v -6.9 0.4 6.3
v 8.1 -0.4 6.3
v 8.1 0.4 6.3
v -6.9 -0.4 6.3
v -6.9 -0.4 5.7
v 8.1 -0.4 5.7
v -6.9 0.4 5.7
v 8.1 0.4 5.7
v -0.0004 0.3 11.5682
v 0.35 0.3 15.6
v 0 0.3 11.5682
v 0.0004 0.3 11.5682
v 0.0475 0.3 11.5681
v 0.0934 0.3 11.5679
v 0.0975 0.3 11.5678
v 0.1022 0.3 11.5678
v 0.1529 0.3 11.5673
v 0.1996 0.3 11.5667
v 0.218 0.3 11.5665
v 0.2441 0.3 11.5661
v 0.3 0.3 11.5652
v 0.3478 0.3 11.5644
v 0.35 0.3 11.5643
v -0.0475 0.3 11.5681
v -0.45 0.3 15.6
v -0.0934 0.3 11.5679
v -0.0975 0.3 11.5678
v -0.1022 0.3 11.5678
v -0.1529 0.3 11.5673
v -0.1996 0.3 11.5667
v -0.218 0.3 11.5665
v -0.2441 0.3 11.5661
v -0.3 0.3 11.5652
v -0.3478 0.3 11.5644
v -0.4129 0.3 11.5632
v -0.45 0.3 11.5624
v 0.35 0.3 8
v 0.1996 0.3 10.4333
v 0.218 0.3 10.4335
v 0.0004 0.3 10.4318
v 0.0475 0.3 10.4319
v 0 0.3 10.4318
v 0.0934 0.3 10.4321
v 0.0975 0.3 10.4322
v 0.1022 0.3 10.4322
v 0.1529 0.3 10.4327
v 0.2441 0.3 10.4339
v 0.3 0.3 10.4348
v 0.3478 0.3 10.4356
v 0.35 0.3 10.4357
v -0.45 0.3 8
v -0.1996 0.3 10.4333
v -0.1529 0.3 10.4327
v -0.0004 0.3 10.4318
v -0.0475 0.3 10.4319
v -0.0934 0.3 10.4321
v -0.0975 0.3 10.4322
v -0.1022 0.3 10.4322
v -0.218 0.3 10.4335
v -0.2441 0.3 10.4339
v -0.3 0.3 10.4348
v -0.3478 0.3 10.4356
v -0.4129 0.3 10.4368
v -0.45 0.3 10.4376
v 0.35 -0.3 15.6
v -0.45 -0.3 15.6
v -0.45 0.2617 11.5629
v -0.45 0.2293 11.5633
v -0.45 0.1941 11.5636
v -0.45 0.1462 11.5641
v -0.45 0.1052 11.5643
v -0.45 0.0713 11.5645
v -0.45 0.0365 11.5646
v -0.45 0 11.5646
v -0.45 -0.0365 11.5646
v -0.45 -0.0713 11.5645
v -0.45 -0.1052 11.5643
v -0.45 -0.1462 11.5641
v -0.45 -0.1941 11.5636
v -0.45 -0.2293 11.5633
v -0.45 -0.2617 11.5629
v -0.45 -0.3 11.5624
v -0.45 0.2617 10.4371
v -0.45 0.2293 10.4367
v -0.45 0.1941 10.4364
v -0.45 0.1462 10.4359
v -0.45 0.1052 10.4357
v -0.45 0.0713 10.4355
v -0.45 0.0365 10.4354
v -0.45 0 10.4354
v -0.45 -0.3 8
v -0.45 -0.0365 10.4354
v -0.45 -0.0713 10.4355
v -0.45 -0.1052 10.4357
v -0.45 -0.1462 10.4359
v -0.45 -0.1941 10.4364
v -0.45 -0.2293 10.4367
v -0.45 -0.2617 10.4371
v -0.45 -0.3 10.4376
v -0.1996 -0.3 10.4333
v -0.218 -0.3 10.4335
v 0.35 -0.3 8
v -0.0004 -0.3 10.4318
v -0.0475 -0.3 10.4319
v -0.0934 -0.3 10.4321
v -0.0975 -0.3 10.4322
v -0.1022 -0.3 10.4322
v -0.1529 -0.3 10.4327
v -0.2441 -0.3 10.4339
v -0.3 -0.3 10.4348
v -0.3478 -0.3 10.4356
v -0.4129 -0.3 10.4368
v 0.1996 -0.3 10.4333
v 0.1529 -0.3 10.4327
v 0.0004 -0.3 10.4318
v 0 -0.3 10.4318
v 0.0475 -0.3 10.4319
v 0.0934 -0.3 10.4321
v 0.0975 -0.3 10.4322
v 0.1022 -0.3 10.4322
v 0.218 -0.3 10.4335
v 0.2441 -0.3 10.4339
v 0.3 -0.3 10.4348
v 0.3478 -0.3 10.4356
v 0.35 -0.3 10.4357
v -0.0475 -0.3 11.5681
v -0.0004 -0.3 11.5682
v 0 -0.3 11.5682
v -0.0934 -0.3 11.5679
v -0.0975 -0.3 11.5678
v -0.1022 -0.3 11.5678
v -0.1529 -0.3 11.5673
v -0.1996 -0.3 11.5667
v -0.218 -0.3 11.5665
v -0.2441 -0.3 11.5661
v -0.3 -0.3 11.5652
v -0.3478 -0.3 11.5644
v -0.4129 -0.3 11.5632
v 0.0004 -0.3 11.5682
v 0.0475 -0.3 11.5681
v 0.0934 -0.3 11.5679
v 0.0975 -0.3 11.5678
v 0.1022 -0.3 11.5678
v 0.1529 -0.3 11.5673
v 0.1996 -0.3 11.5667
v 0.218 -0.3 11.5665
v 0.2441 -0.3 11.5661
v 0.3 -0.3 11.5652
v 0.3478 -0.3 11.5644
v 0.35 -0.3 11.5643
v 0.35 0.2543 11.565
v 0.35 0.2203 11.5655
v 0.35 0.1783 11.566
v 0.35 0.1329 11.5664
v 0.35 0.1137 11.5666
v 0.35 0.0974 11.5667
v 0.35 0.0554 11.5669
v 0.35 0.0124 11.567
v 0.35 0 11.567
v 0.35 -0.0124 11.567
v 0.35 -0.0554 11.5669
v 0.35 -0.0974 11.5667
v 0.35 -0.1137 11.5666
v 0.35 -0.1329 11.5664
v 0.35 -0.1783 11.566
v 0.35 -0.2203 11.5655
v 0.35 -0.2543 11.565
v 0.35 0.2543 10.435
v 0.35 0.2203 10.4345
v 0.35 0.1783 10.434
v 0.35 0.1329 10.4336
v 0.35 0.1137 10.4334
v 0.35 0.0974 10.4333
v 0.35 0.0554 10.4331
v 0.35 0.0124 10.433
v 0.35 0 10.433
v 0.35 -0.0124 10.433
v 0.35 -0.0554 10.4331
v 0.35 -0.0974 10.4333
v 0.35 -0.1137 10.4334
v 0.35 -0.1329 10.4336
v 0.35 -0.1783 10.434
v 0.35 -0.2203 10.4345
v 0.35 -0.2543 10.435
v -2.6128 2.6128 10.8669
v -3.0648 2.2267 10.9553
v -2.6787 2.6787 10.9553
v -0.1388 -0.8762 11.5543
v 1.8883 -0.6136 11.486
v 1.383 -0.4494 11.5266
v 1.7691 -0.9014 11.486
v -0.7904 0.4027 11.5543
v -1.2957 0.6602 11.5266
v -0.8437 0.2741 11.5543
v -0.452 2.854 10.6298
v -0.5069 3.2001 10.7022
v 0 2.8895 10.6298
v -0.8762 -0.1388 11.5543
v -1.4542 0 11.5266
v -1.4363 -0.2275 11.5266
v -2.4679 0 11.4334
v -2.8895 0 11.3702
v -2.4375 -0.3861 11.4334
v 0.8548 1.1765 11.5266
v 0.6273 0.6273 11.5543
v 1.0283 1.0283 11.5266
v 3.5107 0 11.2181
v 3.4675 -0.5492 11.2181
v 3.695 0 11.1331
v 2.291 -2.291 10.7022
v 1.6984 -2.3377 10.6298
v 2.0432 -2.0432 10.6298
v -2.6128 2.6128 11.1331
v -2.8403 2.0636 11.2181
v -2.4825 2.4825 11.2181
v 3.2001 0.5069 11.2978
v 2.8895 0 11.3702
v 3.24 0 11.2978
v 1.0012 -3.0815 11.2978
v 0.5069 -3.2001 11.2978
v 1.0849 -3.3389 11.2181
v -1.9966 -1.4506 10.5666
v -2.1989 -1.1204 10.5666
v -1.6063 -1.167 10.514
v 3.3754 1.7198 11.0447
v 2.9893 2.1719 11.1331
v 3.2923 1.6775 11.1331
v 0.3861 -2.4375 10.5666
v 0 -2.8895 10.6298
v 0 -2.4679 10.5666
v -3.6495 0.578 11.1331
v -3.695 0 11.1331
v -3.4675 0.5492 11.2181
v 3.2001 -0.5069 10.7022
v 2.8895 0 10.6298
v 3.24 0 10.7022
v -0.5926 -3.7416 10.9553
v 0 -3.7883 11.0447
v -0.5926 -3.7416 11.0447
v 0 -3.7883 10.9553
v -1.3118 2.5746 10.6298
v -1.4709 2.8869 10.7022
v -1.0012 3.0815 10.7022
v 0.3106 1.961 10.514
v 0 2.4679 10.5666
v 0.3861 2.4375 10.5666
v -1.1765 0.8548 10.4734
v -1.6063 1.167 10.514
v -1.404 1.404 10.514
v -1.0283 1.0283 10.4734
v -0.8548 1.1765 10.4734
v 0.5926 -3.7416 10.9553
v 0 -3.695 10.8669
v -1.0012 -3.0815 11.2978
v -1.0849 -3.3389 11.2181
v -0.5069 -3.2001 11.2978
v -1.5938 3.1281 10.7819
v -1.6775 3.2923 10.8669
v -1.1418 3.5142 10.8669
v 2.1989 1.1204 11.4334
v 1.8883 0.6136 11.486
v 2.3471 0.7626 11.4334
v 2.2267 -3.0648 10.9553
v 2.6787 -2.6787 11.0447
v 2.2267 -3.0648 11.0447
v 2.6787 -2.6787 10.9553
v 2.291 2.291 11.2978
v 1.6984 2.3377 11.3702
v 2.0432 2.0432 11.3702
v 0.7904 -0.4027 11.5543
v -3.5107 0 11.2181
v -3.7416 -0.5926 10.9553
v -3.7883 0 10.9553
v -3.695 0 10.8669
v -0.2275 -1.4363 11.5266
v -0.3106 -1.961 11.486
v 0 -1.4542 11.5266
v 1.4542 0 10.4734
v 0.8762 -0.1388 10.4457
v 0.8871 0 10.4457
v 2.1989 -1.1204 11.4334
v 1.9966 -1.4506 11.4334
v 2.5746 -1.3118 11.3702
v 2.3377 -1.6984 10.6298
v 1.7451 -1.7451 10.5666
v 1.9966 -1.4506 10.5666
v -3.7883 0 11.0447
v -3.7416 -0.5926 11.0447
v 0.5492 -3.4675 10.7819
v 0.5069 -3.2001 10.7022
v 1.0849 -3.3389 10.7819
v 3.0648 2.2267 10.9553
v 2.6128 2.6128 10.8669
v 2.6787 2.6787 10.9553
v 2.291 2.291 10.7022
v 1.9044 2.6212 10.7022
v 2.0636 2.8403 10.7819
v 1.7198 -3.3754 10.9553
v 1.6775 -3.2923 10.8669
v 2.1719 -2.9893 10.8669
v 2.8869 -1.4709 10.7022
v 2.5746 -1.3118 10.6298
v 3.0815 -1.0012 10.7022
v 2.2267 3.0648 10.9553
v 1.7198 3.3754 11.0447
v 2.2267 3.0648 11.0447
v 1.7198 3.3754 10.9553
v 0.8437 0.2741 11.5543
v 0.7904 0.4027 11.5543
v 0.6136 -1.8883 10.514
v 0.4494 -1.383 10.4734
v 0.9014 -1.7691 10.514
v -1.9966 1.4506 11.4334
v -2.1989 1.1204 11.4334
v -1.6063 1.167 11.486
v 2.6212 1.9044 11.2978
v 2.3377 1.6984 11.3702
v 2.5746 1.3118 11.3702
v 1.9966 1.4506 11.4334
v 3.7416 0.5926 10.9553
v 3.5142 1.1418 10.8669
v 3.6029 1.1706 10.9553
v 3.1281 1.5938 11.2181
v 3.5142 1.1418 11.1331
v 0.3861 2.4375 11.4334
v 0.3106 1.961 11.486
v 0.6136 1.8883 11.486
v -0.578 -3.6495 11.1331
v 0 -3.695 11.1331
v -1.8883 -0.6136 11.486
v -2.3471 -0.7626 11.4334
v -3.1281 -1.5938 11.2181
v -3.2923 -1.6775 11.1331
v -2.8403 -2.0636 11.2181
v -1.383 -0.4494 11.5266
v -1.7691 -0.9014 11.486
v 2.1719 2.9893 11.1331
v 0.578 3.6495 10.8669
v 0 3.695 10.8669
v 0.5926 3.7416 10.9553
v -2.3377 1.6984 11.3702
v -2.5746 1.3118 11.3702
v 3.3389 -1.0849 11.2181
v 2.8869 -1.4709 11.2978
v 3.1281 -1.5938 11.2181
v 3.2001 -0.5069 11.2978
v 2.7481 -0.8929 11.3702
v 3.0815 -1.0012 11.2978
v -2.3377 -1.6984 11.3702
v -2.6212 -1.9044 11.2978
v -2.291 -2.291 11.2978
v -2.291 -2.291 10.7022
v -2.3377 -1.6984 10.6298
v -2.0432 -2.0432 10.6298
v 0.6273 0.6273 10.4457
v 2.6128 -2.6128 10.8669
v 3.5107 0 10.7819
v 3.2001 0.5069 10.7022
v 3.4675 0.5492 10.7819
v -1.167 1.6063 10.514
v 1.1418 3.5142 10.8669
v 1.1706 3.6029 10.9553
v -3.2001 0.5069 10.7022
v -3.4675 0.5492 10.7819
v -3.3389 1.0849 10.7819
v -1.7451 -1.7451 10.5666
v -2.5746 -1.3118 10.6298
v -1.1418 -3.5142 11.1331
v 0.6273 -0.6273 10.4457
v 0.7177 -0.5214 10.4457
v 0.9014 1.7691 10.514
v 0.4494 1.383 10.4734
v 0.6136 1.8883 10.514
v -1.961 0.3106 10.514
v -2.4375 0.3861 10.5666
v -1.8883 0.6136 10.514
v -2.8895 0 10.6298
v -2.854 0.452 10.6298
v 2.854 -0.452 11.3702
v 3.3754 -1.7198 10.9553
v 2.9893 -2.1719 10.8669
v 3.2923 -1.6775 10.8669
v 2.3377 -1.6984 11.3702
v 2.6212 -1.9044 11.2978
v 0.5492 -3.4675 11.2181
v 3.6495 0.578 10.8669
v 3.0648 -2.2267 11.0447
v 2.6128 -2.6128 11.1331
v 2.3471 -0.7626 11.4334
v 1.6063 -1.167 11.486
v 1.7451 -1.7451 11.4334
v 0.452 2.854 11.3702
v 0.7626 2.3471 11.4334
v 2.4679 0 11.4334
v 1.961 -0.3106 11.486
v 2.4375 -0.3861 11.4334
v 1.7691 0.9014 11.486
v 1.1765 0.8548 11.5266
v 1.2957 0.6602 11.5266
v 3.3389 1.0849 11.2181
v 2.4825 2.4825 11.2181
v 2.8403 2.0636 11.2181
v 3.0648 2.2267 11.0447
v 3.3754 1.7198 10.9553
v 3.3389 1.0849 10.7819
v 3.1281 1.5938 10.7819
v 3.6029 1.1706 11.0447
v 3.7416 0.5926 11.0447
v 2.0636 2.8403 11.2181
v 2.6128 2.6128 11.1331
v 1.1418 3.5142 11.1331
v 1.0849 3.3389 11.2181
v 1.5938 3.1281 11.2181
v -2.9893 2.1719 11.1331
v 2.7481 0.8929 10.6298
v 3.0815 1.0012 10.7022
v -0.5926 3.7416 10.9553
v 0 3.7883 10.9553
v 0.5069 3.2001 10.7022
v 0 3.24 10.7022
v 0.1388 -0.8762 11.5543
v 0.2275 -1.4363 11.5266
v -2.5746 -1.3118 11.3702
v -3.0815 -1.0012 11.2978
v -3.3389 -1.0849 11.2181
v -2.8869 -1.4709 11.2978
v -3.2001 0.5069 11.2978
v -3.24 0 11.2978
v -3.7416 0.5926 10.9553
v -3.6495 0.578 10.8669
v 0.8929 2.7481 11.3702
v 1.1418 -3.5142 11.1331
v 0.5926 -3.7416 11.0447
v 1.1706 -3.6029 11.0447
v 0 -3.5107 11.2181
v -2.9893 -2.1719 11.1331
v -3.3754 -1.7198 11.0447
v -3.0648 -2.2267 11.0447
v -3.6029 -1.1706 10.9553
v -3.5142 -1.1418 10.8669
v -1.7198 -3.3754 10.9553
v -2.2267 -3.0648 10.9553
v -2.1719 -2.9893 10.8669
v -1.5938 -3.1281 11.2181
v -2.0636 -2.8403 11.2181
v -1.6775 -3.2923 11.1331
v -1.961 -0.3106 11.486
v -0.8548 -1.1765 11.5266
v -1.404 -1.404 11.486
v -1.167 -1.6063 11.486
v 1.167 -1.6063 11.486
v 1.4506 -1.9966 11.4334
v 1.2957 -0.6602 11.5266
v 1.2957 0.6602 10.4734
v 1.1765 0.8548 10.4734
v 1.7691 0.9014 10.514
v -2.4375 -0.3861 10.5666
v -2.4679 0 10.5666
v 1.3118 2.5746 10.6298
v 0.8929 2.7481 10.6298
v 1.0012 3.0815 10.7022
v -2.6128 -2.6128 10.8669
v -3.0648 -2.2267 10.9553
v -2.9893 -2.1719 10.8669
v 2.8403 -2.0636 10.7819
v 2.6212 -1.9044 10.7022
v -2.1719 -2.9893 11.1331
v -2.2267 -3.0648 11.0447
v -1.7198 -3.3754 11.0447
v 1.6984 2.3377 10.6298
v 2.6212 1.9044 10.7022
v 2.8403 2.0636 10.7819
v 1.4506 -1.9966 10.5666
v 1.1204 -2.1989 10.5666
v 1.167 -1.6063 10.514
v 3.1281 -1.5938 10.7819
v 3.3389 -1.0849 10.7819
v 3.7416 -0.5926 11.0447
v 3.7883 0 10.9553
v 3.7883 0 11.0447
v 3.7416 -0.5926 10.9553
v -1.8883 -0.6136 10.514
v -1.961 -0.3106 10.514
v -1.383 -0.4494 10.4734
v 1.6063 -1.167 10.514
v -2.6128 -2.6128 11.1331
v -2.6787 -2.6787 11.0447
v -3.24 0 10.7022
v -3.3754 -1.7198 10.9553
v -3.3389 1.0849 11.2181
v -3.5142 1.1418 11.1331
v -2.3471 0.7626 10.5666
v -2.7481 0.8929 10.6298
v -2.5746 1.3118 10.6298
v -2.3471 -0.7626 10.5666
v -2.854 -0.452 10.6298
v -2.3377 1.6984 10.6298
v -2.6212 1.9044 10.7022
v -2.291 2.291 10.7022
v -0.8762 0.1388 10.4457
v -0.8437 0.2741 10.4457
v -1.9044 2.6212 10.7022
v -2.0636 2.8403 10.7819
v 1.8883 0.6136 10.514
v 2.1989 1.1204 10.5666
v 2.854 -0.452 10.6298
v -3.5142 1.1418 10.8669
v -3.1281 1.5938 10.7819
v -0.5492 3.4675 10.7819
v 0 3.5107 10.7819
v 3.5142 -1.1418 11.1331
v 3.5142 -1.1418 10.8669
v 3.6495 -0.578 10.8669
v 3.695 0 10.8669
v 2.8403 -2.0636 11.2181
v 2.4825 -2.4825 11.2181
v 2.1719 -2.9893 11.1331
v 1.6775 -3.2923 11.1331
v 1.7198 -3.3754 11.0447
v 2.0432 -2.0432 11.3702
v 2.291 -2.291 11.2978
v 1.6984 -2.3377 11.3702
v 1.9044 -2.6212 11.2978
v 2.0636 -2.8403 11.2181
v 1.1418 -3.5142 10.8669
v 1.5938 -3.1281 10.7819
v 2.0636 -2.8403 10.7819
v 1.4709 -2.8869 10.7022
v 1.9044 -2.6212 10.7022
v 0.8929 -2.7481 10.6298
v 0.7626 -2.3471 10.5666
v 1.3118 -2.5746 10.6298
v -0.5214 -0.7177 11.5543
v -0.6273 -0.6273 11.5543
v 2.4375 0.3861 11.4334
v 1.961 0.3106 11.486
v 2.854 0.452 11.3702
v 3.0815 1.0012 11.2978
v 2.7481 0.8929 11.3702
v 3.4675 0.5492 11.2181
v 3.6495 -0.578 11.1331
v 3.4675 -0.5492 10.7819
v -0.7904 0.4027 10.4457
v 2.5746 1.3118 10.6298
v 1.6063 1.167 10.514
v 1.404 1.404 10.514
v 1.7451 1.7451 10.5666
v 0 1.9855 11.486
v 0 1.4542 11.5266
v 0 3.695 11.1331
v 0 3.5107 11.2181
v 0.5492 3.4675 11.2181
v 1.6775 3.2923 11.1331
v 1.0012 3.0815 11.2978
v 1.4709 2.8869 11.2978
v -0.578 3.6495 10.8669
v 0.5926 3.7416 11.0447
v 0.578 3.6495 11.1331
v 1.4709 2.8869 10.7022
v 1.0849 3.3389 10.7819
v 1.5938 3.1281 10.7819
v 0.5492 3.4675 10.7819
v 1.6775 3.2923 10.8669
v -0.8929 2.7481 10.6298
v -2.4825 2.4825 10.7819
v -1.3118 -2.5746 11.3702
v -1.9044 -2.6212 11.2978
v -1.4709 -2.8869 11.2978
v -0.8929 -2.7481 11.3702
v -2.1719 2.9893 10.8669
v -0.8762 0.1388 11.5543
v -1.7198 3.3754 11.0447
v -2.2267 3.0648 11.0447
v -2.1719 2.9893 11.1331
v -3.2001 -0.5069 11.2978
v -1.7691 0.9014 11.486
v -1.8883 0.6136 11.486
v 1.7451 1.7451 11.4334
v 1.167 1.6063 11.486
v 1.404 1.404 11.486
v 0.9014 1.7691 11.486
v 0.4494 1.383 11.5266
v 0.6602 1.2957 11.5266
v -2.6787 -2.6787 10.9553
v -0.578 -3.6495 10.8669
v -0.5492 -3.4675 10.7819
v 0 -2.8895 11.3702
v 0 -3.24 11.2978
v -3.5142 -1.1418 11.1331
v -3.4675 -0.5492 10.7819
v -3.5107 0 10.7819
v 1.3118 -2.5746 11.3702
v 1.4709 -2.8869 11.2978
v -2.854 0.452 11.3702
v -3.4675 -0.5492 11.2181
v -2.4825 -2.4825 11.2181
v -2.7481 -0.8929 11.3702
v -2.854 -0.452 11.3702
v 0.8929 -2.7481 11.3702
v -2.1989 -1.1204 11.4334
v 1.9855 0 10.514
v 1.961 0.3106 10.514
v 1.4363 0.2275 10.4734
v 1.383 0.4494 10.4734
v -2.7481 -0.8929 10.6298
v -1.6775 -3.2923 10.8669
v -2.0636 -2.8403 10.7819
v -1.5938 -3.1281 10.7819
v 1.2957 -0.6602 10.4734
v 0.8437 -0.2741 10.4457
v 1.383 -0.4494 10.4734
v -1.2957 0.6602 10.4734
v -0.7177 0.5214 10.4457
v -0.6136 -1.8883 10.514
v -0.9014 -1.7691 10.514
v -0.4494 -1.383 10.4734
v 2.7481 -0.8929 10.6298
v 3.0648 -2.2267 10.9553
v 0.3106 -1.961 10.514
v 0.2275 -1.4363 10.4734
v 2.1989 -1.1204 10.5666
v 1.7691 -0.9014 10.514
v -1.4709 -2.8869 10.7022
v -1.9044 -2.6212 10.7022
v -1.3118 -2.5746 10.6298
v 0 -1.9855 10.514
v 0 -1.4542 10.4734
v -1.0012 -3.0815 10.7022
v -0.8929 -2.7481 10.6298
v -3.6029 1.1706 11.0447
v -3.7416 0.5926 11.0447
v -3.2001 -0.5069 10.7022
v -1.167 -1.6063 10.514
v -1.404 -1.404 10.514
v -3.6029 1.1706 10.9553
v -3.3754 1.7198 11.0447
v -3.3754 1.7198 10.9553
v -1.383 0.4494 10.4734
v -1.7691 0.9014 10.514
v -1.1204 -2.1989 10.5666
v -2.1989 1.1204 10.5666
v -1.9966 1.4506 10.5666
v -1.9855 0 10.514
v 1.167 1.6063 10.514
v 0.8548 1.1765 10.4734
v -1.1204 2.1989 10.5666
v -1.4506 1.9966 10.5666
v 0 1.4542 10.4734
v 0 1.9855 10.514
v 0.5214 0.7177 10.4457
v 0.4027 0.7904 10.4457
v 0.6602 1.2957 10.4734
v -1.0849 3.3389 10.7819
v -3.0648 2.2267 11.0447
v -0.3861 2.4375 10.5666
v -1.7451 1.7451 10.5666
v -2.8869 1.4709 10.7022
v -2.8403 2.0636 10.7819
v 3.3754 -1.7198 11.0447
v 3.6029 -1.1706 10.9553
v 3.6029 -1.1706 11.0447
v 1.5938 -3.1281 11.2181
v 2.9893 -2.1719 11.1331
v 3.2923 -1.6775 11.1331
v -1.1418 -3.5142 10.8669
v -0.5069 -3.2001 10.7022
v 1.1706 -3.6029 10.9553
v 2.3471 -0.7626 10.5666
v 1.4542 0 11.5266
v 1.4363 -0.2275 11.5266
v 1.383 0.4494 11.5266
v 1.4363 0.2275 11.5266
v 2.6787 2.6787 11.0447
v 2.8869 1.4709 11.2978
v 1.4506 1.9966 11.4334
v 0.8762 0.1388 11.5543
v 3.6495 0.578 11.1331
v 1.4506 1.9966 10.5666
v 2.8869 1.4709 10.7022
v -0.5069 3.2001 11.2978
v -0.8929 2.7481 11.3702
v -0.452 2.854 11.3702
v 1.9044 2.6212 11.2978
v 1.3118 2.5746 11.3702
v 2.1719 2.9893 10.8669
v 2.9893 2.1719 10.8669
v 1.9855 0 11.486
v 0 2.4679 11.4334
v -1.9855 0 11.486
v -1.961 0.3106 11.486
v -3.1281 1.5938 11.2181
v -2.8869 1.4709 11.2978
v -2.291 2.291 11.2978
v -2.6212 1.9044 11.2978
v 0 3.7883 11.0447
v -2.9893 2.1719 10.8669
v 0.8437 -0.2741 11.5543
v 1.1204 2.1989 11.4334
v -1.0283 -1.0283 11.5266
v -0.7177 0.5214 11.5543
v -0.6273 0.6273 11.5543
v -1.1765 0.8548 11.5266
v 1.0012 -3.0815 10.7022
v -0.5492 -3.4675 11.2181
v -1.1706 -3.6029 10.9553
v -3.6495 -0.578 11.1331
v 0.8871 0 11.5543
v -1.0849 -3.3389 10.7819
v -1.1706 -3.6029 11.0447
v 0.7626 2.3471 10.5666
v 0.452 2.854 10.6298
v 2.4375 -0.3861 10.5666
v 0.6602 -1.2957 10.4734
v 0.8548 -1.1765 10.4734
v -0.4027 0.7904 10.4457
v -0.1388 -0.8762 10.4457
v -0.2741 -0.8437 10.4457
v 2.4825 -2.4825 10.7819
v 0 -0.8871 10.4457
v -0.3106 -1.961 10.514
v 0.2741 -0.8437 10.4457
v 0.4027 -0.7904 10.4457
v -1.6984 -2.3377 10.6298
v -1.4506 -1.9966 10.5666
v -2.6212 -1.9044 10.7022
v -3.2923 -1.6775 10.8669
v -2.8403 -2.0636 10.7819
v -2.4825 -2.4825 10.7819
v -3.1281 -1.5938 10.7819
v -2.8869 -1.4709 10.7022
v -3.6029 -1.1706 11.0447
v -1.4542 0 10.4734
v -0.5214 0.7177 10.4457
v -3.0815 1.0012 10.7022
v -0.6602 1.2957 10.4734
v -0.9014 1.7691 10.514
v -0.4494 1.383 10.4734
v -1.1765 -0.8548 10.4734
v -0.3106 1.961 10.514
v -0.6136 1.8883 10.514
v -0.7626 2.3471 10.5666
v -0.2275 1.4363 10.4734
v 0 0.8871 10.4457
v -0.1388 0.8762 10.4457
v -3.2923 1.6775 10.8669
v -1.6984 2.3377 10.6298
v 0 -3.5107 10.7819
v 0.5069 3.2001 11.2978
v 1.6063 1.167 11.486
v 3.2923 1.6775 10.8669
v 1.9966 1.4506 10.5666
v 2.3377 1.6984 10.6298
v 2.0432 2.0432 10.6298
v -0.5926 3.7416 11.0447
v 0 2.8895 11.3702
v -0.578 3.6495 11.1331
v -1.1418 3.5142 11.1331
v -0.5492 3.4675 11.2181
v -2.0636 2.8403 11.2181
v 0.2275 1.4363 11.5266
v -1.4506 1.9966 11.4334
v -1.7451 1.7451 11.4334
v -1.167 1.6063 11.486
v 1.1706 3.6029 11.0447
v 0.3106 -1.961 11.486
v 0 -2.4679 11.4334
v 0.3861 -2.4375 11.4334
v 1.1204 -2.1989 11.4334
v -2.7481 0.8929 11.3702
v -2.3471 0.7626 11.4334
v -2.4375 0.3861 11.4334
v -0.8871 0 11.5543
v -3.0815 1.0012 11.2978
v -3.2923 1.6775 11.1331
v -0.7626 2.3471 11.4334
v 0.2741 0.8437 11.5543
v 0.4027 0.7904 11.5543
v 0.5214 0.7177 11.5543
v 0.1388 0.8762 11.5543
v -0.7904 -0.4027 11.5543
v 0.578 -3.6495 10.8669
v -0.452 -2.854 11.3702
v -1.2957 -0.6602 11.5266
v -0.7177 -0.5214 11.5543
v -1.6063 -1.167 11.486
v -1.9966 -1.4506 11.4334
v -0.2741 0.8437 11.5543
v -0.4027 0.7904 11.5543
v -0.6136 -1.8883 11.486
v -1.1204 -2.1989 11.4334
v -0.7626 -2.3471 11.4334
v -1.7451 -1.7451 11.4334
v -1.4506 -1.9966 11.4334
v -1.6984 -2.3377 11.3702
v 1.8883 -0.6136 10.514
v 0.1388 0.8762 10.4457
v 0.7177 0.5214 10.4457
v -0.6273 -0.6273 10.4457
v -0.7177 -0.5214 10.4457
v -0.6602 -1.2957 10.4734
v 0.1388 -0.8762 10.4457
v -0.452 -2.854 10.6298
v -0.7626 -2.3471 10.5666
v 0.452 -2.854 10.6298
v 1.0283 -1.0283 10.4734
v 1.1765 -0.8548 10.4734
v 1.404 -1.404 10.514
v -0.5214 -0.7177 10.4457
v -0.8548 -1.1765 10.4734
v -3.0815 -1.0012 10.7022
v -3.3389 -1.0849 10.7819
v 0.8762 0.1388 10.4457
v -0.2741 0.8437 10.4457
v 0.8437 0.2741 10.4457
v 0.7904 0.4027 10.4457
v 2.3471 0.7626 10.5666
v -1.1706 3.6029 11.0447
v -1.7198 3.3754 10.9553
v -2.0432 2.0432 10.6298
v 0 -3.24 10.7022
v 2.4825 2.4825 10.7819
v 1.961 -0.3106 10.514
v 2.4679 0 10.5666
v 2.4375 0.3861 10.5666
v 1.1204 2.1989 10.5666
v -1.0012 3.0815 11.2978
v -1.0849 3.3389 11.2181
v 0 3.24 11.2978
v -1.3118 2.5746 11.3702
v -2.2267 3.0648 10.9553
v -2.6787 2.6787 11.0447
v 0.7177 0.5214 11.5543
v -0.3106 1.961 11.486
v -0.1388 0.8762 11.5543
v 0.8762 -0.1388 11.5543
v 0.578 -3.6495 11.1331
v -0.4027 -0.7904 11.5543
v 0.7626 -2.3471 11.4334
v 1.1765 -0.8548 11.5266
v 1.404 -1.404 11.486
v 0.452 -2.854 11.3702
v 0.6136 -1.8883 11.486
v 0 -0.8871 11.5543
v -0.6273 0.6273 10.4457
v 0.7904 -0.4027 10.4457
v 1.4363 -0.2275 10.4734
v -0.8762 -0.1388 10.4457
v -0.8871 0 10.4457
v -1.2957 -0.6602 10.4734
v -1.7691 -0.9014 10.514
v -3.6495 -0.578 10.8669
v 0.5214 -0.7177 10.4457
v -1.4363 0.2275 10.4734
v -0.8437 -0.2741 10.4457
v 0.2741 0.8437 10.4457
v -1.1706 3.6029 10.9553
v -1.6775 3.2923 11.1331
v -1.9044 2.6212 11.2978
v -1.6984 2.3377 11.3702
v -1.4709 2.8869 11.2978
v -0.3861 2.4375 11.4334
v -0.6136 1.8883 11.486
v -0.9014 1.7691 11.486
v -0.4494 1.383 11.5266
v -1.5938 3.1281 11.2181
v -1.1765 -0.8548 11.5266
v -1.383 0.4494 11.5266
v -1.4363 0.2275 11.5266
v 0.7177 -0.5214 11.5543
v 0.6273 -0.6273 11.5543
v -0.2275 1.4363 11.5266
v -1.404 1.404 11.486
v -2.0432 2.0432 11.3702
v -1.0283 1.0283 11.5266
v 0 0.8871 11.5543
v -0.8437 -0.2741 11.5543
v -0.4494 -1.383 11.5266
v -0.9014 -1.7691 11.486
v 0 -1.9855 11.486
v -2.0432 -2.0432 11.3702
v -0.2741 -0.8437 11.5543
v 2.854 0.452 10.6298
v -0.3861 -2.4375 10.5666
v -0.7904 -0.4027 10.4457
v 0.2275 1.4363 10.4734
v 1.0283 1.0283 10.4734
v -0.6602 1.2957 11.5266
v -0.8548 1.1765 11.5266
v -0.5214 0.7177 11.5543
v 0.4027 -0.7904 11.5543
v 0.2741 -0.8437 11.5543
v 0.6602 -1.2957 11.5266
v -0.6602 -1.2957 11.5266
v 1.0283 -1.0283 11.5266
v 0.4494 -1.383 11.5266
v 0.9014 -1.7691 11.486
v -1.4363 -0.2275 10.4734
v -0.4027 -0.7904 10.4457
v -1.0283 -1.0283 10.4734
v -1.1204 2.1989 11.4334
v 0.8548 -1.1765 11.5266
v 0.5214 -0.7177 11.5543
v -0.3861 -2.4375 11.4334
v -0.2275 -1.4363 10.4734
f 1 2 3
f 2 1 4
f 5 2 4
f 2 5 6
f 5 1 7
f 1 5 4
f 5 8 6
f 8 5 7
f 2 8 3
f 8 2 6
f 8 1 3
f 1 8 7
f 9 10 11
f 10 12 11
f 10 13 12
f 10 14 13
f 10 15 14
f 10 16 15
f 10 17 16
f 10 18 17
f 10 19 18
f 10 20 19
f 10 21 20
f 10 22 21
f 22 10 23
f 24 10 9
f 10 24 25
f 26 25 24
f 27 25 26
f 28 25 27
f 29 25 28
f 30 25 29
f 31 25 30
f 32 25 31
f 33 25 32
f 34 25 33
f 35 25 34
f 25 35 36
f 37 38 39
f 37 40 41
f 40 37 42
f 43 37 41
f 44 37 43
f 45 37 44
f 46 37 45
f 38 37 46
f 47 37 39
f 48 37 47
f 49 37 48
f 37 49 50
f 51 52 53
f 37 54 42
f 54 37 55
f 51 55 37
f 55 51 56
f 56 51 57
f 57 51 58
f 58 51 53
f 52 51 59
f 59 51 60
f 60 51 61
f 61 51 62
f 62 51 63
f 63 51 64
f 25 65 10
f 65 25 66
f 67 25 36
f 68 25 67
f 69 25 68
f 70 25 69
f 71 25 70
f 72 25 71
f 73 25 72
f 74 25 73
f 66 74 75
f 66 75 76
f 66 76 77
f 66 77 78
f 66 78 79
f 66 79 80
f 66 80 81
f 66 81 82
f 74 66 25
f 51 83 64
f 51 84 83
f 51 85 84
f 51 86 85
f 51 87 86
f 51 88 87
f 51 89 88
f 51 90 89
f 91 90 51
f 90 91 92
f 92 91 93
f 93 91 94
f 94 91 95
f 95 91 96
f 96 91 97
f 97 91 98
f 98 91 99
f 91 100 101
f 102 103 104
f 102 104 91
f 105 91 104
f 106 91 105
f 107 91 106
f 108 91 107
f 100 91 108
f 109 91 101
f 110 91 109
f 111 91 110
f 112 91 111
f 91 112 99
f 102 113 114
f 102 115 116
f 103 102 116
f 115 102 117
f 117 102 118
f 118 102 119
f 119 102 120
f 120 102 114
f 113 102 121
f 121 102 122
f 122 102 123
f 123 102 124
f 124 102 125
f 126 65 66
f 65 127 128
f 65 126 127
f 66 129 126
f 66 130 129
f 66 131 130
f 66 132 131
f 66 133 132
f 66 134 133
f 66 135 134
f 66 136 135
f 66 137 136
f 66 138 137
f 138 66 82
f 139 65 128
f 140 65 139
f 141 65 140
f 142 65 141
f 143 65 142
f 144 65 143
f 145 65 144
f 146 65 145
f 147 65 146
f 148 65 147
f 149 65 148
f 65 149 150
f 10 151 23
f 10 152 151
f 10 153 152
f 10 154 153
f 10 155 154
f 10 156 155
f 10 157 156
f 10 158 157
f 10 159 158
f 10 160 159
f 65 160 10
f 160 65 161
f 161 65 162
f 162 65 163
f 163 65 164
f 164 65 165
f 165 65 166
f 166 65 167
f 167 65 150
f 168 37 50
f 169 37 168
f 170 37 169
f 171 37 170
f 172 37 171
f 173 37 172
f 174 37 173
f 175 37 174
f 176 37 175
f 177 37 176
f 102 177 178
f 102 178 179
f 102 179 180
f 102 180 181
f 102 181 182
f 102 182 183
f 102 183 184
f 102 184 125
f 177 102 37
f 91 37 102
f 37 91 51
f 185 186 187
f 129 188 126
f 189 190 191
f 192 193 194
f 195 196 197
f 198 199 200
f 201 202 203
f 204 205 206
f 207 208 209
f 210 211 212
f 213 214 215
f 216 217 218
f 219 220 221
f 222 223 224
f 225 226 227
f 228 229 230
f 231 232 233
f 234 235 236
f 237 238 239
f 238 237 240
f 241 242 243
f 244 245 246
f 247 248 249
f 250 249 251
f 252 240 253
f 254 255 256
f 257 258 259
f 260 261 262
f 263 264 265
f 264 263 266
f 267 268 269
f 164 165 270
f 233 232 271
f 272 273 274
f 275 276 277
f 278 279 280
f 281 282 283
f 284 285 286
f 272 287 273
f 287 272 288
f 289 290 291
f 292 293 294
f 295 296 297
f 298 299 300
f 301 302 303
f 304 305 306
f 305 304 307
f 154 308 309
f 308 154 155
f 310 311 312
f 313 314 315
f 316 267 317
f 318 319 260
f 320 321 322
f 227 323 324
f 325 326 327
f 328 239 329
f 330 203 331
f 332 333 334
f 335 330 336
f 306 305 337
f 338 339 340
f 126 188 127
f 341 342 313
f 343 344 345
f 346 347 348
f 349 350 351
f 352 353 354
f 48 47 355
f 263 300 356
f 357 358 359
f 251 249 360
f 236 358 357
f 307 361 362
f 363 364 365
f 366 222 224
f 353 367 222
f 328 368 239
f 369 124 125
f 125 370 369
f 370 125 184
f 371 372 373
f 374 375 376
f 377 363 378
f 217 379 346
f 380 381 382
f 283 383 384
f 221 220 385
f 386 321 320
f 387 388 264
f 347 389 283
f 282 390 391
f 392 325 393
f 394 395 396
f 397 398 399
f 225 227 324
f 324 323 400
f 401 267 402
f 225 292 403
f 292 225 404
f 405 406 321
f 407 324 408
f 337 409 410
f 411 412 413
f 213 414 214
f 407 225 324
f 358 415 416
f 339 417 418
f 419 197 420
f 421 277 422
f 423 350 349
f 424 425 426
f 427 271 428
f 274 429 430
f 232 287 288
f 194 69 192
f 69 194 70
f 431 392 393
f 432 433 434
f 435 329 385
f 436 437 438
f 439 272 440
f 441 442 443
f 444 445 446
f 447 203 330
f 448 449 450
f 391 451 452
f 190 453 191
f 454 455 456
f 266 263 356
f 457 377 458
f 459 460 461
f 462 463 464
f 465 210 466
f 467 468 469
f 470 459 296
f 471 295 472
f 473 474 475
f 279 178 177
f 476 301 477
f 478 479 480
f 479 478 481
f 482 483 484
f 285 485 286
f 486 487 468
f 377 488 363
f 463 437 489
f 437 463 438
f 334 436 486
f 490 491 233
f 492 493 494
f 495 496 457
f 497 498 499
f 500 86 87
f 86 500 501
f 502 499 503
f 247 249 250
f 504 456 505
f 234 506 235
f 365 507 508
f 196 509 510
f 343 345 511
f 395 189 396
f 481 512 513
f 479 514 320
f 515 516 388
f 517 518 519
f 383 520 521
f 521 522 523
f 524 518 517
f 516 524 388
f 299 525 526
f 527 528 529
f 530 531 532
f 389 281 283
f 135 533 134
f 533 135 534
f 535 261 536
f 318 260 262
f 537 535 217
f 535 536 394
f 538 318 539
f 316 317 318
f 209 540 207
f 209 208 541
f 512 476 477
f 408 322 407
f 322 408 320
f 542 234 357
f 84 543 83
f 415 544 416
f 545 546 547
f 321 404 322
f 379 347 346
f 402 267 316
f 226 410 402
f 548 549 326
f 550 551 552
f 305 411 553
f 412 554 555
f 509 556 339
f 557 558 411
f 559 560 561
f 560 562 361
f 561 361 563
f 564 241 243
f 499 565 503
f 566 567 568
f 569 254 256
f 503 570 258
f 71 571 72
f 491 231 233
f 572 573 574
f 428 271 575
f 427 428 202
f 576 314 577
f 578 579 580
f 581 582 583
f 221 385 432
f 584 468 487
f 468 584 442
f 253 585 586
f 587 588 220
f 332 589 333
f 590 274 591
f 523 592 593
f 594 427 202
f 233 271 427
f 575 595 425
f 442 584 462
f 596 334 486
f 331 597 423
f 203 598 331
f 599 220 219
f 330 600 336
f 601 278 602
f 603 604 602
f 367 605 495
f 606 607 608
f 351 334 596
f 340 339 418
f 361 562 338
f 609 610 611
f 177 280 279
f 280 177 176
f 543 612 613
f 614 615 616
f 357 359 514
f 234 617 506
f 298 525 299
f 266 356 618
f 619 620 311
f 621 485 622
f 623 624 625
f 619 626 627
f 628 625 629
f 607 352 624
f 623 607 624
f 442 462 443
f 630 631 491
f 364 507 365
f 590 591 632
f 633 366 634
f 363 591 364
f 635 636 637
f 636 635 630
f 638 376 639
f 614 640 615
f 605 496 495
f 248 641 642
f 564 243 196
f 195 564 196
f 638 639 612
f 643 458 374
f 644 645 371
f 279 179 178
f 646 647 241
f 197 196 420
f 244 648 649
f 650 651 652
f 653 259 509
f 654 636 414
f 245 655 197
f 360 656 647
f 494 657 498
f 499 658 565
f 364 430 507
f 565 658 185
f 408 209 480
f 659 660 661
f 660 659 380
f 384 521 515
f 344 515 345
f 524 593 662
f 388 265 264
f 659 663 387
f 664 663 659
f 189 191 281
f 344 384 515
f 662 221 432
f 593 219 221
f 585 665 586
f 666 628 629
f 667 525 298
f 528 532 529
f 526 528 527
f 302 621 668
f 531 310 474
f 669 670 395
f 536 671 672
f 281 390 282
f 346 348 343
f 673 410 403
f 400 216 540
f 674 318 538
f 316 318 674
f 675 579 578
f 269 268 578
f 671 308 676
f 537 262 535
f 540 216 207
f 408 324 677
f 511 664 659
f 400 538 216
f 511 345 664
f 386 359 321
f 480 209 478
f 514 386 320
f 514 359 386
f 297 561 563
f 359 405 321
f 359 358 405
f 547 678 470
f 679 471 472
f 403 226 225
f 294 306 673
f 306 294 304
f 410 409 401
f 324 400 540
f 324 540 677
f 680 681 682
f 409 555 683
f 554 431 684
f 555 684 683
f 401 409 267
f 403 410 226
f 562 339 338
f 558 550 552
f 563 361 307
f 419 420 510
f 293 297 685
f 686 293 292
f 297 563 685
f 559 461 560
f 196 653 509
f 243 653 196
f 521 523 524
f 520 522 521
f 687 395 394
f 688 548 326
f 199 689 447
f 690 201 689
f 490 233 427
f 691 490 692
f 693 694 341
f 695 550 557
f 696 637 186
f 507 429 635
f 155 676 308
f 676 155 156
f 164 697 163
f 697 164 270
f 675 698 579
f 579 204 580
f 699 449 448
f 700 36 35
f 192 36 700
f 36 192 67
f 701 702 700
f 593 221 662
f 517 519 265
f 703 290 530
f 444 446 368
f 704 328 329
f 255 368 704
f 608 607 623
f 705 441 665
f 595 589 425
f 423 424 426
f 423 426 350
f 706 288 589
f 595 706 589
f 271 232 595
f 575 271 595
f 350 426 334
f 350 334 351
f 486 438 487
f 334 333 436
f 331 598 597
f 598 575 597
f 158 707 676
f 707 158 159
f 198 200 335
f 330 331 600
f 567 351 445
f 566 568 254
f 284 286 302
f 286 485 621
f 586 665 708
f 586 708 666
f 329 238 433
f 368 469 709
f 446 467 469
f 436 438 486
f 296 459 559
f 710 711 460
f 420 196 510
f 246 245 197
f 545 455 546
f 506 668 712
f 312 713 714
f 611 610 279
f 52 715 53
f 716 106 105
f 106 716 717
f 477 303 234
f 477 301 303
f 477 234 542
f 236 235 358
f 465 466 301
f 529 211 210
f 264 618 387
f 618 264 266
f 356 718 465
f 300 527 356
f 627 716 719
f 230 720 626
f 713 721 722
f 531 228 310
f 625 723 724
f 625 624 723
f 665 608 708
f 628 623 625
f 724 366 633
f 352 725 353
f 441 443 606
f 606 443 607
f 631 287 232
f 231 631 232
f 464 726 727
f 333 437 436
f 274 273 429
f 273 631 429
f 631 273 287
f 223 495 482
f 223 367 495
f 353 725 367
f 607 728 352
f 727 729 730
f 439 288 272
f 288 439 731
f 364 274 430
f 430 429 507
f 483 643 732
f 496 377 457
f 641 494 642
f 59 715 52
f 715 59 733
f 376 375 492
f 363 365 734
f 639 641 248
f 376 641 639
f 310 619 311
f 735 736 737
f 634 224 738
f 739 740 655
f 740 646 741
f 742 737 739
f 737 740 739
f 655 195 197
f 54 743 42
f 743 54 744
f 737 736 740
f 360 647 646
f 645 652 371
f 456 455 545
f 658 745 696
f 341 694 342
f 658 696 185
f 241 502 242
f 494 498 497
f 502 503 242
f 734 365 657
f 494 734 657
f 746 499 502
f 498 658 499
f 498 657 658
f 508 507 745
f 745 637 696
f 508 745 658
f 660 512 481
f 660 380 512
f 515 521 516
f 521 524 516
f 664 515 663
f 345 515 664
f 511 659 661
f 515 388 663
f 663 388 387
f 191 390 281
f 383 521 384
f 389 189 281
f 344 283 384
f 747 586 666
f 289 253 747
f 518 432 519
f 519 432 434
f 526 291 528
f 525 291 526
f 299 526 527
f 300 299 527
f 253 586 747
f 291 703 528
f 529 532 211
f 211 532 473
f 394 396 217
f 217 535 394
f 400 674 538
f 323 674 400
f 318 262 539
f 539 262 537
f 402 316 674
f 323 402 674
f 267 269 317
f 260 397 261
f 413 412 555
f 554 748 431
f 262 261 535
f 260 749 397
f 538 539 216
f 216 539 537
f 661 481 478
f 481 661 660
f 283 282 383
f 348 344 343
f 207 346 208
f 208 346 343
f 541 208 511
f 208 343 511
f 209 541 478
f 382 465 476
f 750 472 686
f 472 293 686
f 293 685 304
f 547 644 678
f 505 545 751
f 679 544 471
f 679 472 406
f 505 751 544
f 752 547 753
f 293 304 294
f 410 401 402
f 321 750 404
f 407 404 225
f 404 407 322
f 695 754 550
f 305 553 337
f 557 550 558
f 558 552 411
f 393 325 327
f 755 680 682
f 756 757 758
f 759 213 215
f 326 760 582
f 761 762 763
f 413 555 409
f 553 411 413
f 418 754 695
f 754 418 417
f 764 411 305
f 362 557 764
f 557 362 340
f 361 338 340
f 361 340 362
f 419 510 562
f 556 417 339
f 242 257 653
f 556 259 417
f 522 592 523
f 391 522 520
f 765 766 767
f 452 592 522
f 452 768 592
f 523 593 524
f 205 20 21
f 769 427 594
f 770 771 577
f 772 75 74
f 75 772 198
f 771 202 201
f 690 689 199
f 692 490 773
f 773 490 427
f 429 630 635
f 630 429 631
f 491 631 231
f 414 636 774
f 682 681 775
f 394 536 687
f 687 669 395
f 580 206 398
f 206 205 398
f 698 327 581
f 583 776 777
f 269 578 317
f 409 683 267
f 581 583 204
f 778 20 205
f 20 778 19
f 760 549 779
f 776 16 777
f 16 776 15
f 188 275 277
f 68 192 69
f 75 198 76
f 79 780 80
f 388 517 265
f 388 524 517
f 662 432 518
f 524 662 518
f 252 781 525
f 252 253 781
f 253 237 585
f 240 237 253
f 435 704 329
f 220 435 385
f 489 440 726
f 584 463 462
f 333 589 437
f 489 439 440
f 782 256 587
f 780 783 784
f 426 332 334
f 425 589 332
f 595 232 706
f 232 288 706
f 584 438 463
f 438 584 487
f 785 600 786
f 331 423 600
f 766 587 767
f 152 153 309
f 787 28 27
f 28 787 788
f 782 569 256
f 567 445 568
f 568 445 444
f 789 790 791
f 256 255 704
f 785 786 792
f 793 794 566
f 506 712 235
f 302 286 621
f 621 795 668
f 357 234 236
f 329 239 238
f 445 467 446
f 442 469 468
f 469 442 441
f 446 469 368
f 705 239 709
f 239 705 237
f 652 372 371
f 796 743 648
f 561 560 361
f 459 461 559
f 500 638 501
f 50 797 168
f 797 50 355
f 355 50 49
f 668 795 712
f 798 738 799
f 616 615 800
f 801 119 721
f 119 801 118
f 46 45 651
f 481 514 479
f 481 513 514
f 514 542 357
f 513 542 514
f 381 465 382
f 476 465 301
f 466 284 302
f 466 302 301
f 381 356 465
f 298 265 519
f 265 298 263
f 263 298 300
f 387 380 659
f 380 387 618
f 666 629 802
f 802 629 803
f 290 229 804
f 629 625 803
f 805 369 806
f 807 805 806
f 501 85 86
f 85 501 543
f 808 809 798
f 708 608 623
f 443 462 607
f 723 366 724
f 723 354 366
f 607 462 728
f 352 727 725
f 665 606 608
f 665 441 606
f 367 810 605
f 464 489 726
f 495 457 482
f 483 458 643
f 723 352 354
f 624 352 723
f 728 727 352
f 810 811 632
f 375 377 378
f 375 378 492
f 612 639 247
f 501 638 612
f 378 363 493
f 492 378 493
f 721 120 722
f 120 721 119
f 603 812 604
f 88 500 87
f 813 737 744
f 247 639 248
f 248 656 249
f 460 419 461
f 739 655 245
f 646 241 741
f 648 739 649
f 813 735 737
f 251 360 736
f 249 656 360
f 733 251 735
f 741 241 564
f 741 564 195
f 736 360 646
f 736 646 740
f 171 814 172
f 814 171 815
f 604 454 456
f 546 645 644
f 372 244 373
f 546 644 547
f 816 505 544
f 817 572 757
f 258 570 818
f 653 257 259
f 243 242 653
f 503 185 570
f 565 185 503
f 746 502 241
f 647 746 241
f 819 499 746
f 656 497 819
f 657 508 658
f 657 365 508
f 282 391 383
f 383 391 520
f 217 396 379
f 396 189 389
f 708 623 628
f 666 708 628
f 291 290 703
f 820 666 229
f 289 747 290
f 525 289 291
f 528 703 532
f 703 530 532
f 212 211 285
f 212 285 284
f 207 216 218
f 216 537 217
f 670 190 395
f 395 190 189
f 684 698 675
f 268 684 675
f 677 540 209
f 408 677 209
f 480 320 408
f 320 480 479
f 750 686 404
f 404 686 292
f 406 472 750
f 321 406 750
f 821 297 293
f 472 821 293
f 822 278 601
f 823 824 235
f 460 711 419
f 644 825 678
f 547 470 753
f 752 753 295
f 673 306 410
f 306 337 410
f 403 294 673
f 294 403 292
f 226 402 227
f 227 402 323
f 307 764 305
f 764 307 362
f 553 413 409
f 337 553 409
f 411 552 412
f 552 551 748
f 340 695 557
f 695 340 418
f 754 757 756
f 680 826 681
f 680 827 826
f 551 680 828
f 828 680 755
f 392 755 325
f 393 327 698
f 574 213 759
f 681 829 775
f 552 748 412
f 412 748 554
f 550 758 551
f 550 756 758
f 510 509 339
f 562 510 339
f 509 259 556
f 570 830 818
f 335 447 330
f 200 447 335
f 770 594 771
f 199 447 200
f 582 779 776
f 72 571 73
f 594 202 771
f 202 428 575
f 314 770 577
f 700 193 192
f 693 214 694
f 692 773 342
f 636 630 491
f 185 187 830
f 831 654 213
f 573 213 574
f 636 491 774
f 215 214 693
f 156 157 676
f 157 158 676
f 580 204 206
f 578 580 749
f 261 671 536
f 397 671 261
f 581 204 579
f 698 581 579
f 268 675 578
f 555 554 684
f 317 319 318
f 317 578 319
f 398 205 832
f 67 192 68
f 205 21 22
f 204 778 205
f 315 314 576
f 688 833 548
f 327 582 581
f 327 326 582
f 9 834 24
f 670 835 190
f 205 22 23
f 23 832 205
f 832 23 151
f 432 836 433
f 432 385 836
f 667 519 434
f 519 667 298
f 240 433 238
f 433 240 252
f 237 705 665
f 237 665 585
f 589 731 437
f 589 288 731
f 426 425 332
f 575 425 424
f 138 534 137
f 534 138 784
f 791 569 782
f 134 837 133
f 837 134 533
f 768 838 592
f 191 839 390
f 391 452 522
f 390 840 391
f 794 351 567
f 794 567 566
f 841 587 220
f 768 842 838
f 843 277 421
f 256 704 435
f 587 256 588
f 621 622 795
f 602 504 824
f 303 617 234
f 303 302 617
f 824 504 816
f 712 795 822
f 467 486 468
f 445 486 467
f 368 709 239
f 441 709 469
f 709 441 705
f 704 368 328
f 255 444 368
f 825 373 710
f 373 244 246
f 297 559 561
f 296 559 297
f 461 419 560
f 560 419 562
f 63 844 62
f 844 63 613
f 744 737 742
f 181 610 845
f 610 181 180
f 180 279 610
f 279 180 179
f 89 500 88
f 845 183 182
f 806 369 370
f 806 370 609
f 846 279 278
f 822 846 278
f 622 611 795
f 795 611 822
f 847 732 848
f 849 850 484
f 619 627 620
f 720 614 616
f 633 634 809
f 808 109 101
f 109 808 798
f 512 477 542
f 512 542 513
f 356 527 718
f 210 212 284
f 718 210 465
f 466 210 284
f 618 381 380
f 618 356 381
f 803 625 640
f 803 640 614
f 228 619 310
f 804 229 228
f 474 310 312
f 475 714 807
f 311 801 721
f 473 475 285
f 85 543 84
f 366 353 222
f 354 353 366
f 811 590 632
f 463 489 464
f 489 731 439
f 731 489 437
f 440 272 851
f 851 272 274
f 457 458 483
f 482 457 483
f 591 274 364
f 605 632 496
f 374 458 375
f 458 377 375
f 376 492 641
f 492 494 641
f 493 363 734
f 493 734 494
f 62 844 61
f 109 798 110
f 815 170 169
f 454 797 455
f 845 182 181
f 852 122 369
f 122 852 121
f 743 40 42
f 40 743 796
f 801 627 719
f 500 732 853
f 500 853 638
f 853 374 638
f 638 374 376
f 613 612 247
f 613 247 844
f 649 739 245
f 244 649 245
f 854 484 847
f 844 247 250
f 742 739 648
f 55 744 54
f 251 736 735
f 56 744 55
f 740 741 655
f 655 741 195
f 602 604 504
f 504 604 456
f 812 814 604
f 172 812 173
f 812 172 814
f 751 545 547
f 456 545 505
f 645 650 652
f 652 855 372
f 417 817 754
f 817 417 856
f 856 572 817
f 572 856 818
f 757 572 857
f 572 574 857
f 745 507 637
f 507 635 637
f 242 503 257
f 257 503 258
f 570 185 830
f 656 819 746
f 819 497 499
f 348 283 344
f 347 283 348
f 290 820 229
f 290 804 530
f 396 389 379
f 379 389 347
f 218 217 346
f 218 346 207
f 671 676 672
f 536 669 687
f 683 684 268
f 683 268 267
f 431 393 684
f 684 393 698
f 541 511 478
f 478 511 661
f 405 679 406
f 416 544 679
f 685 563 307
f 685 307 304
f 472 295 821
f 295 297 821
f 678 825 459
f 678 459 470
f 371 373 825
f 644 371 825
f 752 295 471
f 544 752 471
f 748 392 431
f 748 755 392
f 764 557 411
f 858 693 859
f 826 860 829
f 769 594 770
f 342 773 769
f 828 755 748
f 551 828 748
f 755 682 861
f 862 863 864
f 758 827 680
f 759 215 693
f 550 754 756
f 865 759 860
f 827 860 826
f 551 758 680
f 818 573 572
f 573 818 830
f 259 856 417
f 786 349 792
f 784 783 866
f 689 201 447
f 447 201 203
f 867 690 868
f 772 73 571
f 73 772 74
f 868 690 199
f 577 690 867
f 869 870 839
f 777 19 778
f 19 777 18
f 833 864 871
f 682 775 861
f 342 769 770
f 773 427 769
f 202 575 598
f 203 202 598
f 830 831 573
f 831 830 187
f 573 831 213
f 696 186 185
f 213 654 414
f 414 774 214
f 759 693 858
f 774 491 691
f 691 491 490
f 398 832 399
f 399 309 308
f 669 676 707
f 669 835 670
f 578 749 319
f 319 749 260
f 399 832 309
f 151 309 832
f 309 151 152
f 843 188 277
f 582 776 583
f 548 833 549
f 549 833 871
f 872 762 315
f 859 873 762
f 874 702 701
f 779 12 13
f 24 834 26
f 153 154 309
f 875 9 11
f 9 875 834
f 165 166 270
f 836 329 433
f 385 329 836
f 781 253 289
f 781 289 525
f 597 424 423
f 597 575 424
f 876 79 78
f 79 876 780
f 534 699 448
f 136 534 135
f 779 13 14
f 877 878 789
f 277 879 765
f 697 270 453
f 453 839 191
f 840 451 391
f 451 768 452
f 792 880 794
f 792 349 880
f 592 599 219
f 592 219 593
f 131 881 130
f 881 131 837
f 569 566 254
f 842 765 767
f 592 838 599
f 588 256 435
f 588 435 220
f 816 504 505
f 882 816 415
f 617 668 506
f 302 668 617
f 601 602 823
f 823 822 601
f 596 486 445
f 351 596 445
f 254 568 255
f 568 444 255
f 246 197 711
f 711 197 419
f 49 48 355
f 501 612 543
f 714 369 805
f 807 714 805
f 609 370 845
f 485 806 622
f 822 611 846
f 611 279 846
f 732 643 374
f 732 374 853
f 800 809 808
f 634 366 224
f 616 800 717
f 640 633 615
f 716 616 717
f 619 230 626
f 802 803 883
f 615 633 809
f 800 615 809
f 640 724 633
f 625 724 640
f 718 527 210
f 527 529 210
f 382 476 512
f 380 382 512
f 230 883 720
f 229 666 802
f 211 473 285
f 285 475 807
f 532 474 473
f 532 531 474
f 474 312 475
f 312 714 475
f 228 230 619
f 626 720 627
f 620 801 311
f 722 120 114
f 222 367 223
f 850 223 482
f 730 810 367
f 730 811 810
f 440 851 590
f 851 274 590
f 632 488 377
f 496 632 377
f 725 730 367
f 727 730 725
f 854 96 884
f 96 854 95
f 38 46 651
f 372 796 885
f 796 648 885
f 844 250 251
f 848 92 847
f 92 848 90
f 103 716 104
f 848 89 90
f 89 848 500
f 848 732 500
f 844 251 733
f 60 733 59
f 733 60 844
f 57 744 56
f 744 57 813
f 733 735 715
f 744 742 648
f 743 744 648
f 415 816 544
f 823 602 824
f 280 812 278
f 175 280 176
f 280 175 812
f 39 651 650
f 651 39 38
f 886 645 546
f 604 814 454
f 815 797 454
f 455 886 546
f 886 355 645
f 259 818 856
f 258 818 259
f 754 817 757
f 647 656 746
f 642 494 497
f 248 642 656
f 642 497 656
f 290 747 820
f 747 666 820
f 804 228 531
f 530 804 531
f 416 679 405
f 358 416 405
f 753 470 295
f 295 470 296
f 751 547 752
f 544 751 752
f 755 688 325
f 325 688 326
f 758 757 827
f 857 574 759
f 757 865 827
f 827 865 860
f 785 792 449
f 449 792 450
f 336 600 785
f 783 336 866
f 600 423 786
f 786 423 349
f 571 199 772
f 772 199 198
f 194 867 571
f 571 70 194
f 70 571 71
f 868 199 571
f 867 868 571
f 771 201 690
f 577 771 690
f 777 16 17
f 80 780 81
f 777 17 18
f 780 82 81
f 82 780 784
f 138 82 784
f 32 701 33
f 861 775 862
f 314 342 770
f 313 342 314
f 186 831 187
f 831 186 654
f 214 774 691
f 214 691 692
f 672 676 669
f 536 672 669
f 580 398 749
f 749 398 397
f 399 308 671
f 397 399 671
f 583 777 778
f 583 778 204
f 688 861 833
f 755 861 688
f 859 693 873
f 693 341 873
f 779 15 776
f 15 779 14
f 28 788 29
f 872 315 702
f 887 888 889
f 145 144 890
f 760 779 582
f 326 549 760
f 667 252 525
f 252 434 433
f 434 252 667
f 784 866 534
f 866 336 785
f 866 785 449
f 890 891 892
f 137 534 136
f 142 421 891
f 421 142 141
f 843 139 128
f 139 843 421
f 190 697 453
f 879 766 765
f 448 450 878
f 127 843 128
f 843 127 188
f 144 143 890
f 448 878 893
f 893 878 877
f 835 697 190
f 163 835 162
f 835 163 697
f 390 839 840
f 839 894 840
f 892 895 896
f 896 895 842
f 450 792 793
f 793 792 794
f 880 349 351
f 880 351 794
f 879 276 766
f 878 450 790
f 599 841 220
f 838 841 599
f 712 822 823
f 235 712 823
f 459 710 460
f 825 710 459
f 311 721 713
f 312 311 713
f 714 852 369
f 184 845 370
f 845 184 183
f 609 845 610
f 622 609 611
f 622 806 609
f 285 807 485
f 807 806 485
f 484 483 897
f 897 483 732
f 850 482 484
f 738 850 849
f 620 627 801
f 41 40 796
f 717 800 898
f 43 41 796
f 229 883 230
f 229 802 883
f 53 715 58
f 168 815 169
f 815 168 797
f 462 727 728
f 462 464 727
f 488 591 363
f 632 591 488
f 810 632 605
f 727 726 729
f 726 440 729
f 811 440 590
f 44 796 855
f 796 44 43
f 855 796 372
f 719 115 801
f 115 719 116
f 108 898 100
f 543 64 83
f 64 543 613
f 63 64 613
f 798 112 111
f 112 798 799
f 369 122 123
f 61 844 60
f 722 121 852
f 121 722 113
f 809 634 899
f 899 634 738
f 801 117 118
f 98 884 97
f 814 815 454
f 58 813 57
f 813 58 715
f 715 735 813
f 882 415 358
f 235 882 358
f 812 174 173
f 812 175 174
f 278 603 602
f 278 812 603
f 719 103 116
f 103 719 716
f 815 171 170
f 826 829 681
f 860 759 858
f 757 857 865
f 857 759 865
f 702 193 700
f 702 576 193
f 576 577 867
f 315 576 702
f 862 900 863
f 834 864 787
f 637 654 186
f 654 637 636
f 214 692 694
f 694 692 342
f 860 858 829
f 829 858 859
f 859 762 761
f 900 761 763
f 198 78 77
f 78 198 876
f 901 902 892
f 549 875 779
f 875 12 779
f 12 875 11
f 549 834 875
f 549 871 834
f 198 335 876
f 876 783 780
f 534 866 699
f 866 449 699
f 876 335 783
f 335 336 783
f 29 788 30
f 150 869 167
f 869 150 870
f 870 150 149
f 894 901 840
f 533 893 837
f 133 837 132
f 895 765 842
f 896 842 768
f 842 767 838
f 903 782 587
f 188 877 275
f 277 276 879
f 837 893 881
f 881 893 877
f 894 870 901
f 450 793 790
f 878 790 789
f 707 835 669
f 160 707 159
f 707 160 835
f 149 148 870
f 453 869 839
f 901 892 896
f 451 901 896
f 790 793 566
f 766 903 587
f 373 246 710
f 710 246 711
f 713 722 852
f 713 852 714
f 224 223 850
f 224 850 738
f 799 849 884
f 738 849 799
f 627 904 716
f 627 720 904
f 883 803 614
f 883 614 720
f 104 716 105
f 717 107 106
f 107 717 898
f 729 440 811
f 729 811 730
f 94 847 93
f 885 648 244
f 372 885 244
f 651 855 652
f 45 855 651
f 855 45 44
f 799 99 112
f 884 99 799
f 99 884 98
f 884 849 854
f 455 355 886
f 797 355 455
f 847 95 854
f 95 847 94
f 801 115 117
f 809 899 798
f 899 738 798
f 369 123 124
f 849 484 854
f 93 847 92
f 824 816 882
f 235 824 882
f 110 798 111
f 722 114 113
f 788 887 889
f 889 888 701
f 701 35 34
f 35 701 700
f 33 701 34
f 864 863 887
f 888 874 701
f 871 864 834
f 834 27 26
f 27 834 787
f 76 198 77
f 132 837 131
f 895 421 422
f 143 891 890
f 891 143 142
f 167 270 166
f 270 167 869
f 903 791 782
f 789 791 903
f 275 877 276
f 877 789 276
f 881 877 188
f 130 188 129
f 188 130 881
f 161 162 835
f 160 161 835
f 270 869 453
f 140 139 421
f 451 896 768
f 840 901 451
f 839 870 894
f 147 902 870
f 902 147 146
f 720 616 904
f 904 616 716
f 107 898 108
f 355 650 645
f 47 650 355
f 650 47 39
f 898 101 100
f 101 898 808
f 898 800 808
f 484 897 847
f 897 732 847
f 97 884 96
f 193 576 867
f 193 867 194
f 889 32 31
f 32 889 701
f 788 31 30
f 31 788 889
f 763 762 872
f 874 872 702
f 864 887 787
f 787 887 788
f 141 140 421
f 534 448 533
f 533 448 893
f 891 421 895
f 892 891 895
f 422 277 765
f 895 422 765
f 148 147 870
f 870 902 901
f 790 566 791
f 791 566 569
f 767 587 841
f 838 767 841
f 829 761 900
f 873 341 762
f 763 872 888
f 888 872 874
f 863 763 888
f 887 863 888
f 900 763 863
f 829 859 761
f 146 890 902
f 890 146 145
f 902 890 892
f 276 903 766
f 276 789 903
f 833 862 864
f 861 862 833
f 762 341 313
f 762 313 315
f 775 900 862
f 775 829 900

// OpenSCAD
// short length / neck is the circle diameter

circleThickness = 1;
radius = 3.8;
excess_rotation = -36-(80);


// arms
   
color("DarkGray")
translate([0.6-(5.5*$t),-1*$t,6-(1*$t)])
rotate([0-(40*$t),0,90])
cube([0.8-(0.2*$t),15-(2*$t),0.6],center=true);

color("DarkGray")
translate([0.6+(4.5*$t),-1*$t,6-(1*$t)])
rotate([0+(40*$t),0,90])
cube([0.8,15-(2*$t),0.6],center=true);

color("DarkGray")
translate([0.6,0,6-(5*$t)])
rotate([0,0,90])
cube([0.8,15,0.6],center=true);





// neck
rotate([0,0,-90*$t])
color("DarkGray")
translate([-4.25,(6)*sin(360),4+(7.8)])
rotate([0,90,90+(360)])
translate([0,-4.2,0])
cube([radius*2,0.8,0.6],center=true);


// black smarties
// seat
translate([0,0,11-(2*$t)])
rotate([90*$t,0,0])
color("black")
scale([1,1,0.15])
sphere(radius,$fn=40);

translate([7.5*$t,0,11-(10*$t)])
rotate([90*$t,0,0])
color("black")
scale([1,1,0.15])
sphere(radius,$fn=40);

translate([-7.5*$t,0,11-(10*$t)])
rotate([90*$t,0,0])
color("black")
scale([1,1,0.15])
sphere(radius,$fn=40);




// head
translate([0,0,16])
rotate([180-(90),90,-90*$t])
union(){
translate([-4.5,1.3,0.4])
rotate([-5,-5,0])
scale(0.25)
union(){
triagon_distance = 3.5;
xtra_rotation = -30;
wall_thickness = 0.5;

rotate([0,0,120+xtra_rotation])
translate([triagon_distance,0,0])
rotate([0,0,60])
difference(){
regular_star(1.5,3,3);
regular_star(1.5,3-(wall_thickness*2),3-(wall_thickness*2));
}

rotate([0,0,240+xtra_rotation])
translate([triagon_distance,0,0])
difference(){
cylinder(1, 2.25, 2.25, $fn=30,center=true);
cylinder(1.1, 2.25-wall_thickness, 2.25-wall_thickness, $fn=30,center=true);
}

rotate([0,0,360+xtra_rotation])
translate([triagon_distance,0,0])
rotate([0,0,30])
difference(){
cube([4.5,4.5,1],center=true);
cube([4.5-(wall_thickness*2),4.5-(wall_thickness*2),1.2],center=true);
}
}

rotate([0,0,0])   
translate([-3,0,0])
color("Black")
scale([1,1,0.15])
sphere(radius,$fn=40);
}




module regular_star(points = 5, outer_r = 10, inner_r = 4) {
    steps = points * 2;
    star_points = [
        for (i = [0 : steps - 1])
            let (
                angle = 360 / steps * i,
                radius = (i % 2 == 0) ? outer_r : inner_r
            )
            [cos(angle) * radius, sin(angle) * radius]
    ];
    polygon(points = star_points);
}




// short length / neck is the circle diameter
// bike 
